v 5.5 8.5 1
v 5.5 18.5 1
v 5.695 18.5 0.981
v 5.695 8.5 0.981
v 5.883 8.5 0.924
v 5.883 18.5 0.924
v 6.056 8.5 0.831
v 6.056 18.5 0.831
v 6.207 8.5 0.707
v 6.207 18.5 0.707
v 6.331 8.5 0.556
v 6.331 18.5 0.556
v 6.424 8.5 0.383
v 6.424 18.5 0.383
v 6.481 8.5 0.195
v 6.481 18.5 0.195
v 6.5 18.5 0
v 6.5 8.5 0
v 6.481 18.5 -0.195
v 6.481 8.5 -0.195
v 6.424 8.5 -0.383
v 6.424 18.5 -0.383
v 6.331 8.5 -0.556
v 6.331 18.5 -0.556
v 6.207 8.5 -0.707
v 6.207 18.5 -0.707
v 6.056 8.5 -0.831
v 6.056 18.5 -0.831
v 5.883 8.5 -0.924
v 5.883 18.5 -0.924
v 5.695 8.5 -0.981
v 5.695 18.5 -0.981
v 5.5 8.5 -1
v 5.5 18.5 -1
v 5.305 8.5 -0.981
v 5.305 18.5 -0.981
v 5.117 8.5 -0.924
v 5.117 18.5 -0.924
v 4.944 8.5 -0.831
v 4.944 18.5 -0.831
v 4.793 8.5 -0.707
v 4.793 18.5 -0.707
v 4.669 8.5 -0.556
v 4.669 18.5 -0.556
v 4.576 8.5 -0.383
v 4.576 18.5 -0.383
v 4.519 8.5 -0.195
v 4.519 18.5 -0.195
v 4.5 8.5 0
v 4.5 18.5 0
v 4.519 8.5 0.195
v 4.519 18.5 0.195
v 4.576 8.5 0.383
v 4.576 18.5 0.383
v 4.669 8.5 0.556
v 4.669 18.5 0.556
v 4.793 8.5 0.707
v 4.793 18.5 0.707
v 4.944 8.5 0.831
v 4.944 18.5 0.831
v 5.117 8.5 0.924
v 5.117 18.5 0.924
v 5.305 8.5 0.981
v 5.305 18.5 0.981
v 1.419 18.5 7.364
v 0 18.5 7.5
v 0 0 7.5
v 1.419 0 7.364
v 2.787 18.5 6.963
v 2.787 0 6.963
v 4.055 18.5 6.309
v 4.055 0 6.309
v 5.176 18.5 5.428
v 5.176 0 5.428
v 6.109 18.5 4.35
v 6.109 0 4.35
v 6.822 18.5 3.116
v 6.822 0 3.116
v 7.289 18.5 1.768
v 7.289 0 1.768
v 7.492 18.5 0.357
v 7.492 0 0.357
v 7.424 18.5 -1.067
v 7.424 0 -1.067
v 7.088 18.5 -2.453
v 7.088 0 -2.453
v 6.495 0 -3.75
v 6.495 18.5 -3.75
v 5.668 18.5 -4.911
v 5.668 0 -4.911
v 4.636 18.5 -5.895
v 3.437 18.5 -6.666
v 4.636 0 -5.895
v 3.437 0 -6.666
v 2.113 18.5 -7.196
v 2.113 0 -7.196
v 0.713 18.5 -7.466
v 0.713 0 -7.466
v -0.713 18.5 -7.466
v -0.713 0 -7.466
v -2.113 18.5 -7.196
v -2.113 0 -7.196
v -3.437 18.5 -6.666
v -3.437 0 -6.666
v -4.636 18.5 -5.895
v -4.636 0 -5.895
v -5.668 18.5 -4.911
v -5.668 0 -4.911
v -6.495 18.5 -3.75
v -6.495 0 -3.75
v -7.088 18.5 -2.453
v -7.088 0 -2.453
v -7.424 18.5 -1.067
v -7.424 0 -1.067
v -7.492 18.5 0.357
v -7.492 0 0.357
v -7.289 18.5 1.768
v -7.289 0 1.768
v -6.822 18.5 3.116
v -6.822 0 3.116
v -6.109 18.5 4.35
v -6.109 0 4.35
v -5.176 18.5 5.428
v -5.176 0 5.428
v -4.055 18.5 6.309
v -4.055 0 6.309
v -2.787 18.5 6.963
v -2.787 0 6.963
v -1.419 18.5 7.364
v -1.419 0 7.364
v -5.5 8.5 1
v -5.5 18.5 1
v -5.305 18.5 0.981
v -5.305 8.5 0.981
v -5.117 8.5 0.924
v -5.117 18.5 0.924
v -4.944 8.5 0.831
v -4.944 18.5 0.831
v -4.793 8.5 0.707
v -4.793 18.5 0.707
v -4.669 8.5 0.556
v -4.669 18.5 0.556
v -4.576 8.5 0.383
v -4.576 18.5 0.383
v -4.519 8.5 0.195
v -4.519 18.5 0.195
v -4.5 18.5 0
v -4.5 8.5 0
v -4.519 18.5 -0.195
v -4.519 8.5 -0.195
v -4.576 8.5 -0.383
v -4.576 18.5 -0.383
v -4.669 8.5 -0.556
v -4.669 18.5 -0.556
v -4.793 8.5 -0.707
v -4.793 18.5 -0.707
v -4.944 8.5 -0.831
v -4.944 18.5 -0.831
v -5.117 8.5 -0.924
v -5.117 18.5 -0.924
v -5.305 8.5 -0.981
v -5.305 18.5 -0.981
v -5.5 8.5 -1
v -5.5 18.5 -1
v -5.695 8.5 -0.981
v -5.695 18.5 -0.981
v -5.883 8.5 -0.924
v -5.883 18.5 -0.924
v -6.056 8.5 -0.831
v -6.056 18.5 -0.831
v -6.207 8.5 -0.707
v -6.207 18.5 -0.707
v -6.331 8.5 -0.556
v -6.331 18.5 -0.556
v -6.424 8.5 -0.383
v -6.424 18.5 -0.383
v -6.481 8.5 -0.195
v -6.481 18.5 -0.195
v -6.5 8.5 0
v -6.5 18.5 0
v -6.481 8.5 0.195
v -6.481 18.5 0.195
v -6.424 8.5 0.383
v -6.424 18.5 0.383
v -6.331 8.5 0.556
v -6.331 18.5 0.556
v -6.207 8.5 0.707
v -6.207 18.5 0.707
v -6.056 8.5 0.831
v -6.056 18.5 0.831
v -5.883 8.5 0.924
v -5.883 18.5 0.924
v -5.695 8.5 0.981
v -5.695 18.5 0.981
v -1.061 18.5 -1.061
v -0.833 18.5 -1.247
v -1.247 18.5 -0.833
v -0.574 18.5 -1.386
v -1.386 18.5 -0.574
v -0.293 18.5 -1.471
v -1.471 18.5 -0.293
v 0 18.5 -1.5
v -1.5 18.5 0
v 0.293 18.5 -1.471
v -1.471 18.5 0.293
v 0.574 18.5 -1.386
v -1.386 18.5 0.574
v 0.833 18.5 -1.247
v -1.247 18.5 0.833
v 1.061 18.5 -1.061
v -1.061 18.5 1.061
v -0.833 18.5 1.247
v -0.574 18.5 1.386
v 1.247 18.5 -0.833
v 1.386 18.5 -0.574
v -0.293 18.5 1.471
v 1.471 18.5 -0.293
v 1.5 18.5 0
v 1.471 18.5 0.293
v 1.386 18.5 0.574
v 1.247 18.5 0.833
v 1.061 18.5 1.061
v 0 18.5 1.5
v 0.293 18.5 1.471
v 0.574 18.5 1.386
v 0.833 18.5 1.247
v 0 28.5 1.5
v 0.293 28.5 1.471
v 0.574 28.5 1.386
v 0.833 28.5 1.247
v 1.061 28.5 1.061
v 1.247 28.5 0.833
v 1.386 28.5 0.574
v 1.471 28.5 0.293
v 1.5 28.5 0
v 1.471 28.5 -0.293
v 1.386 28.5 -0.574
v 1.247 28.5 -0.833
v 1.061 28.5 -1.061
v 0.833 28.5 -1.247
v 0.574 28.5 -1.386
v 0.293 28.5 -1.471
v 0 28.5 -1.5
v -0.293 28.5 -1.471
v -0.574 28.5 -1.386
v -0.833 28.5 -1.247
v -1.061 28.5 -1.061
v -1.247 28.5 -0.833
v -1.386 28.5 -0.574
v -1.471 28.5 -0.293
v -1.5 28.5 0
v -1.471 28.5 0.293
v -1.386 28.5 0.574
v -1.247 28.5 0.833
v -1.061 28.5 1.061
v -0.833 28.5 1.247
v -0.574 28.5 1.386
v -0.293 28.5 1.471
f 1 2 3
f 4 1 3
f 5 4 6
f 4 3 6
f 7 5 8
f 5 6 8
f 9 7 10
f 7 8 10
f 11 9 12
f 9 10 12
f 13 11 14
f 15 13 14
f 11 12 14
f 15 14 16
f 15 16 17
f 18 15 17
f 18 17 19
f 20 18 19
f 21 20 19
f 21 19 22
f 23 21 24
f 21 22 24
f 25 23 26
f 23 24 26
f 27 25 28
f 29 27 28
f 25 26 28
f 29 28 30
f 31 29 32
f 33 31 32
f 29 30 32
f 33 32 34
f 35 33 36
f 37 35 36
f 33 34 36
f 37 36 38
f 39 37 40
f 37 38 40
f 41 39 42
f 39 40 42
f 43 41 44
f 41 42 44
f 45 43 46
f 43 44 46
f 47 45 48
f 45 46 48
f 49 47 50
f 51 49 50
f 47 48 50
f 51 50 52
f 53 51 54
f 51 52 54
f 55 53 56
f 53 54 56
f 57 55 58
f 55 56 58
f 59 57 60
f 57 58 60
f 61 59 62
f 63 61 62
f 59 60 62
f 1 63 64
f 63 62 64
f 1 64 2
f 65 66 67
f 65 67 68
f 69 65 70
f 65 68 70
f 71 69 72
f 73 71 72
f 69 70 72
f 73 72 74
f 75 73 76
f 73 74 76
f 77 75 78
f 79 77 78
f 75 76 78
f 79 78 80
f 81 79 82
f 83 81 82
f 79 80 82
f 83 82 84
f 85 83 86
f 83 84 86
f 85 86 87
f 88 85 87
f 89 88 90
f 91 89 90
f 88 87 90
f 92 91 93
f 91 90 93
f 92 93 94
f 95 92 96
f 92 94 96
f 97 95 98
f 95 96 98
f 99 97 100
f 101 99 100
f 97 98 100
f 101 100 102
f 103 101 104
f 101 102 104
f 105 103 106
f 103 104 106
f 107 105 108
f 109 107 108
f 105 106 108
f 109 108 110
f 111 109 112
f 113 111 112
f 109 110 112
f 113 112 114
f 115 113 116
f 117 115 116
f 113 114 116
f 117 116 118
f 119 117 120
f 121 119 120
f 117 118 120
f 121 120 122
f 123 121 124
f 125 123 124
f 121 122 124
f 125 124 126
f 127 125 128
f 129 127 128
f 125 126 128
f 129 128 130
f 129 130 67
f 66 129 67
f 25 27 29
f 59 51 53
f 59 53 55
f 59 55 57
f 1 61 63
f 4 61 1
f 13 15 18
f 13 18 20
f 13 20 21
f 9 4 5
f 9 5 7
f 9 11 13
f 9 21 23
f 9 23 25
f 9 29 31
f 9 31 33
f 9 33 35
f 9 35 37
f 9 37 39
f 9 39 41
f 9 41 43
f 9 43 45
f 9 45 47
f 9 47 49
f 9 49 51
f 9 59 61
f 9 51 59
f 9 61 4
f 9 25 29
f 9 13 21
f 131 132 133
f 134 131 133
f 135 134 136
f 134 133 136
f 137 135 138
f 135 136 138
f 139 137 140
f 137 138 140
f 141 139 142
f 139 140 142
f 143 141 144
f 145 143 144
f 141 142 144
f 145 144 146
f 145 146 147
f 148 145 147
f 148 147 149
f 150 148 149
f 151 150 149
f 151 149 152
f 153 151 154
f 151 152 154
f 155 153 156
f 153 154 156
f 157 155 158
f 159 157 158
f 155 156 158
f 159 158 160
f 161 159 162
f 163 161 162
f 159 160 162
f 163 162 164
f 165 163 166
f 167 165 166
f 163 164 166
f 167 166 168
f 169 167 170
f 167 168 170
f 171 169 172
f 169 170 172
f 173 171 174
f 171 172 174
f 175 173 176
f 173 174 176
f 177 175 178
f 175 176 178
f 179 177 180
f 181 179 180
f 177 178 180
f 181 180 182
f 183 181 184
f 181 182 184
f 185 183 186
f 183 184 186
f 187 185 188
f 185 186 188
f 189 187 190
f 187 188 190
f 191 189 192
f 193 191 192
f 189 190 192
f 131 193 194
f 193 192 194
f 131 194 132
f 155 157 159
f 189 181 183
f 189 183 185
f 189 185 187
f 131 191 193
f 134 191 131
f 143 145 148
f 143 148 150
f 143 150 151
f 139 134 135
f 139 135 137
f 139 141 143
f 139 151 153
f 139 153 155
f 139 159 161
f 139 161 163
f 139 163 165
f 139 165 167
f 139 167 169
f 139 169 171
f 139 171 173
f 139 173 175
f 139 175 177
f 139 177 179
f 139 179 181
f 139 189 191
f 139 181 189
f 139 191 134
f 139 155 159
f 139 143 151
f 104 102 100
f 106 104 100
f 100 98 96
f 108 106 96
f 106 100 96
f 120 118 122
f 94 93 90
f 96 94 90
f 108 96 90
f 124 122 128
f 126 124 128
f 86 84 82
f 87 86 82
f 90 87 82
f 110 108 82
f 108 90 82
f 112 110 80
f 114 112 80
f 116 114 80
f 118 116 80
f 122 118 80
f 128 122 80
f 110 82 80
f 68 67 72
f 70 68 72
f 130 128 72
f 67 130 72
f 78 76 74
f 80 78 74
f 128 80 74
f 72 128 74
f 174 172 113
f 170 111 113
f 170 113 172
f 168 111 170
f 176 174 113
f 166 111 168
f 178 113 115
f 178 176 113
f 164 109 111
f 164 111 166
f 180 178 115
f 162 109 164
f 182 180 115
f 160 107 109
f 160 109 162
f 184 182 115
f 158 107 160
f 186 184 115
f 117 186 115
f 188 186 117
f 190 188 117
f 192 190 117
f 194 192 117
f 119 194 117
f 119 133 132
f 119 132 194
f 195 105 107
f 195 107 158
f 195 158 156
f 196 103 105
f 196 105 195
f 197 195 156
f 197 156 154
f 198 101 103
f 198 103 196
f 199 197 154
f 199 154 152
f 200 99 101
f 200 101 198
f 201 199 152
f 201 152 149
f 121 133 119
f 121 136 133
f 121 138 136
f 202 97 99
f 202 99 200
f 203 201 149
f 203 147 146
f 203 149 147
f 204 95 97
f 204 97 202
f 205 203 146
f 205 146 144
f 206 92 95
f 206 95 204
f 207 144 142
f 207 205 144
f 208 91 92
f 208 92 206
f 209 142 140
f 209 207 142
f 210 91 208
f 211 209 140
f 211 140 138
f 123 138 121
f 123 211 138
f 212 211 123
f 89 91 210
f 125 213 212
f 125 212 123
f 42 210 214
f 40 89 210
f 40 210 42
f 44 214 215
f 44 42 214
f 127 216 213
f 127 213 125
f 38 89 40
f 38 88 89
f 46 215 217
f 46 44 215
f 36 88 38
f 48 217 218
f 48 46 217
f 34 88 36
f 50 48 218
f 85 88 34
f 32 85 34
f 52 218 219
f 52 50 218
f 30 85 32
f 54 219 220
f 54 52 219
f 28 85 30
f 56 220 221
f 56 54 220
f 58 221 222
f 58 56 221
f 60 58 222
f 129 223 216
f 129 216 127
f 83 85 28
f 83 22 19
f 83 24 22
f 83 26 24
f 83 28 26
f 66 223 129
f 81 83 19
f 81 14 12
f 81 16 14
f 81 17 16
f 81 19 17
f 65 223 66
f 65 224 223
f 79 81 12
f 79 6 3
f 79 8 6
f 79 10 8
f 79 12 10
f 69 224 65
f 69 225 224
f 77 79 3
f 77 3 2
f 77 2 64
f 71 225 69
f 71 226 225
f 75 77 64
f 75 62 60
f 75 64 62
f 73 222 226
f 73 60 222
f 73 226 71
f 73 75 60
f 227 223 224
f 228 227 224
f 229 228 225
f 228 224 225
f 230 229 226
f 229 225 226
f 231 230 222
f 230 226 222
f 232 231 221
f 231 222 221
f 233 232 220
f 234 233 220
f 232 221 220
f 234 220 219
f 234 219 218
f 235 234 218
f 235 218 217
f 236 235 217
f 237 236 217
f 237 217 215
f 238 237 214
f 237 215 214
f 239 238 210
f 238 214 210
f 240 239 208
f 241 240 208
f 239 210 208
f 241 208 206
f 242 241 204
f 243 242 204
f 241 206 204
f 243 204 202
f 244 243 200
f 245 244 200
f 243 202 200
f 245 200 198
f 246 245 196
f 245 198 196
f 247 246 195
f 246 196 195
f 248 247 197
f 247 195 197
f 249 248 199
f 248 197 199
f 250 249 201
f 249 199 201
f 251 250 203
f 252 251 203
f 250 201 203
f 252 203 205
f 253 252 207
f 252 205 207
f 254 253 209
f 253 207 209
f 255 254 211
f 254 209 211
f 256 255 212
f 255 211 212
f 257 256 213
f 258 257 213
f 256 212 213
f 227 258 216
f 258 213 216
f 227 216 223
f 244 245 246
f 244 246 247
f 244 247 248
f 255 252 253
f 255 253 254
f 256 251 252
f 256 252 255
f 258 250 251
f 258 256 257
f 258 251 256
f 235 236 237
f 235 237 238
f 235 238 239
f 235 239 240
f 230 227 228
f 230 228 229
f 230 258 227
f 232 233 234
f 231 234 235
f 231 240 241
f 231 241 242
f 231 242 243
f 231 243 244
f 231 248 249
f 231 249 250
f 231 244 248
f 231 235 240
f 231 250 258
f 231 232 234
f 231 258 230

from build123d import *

# Parameters (mm, degrees)
SKETCH_1_R          = 7.5
EXTRUDE_1_DEPTH     = 18.5
SKETCH_2_R          = 1.5
EXTRUDE_2_DEPTH     = 10
SKETCH_3_R          = 1
CUT_EXTRUDE_1_DEPTH = 10


with BuildPart() as part:
    # 草图1 → 凸台-拉伸1 (new body)
    with BuildSketch(Plane(origin=(0, 0, 0), x_dir=(1, 0, 0), z_dir=(0, 1, 0))):
        with Locations(Location((0, 0, 0), (0, 0, 270))):
            Circle(SKETCH_1_R)
    extrude(amount=EXTRUDE_1_DEPTH)

    # 草图2 → 凸台-拉伸2 (add)
    with BuildSketch(Plane(origin=(0, 18.5, 0), x_dir=(1, 0, 0), z_dir=(0, 1, 0))):
        with Locations(Location((0, 0, 0), (0, 0, 270))):
            Circle(SKETCH_2_R)
    extrude(amount=EXTRUDE_2_DEPTH)

    # 草图3 → 切除-拉伸1 (cut)
    with BuildSketch(Plane(origin=(0, 18.5, 0), x_dir=(1, 0, 0), z_dir=(0, 1, 0))):
        with Locations(Location((-5.5, 0, 0), (0, 0, 270))):
            Circle(SKETCH_3_R)
        with Locations(Location((5.5, 0, 0), (0, 0, 270))):
            Circle(SKETCH_3_R)
    extrude(amount=-CUT_EXTRUDE_1_DEPTH, mode=Mode.SUBTRACT)


solid = part.part
